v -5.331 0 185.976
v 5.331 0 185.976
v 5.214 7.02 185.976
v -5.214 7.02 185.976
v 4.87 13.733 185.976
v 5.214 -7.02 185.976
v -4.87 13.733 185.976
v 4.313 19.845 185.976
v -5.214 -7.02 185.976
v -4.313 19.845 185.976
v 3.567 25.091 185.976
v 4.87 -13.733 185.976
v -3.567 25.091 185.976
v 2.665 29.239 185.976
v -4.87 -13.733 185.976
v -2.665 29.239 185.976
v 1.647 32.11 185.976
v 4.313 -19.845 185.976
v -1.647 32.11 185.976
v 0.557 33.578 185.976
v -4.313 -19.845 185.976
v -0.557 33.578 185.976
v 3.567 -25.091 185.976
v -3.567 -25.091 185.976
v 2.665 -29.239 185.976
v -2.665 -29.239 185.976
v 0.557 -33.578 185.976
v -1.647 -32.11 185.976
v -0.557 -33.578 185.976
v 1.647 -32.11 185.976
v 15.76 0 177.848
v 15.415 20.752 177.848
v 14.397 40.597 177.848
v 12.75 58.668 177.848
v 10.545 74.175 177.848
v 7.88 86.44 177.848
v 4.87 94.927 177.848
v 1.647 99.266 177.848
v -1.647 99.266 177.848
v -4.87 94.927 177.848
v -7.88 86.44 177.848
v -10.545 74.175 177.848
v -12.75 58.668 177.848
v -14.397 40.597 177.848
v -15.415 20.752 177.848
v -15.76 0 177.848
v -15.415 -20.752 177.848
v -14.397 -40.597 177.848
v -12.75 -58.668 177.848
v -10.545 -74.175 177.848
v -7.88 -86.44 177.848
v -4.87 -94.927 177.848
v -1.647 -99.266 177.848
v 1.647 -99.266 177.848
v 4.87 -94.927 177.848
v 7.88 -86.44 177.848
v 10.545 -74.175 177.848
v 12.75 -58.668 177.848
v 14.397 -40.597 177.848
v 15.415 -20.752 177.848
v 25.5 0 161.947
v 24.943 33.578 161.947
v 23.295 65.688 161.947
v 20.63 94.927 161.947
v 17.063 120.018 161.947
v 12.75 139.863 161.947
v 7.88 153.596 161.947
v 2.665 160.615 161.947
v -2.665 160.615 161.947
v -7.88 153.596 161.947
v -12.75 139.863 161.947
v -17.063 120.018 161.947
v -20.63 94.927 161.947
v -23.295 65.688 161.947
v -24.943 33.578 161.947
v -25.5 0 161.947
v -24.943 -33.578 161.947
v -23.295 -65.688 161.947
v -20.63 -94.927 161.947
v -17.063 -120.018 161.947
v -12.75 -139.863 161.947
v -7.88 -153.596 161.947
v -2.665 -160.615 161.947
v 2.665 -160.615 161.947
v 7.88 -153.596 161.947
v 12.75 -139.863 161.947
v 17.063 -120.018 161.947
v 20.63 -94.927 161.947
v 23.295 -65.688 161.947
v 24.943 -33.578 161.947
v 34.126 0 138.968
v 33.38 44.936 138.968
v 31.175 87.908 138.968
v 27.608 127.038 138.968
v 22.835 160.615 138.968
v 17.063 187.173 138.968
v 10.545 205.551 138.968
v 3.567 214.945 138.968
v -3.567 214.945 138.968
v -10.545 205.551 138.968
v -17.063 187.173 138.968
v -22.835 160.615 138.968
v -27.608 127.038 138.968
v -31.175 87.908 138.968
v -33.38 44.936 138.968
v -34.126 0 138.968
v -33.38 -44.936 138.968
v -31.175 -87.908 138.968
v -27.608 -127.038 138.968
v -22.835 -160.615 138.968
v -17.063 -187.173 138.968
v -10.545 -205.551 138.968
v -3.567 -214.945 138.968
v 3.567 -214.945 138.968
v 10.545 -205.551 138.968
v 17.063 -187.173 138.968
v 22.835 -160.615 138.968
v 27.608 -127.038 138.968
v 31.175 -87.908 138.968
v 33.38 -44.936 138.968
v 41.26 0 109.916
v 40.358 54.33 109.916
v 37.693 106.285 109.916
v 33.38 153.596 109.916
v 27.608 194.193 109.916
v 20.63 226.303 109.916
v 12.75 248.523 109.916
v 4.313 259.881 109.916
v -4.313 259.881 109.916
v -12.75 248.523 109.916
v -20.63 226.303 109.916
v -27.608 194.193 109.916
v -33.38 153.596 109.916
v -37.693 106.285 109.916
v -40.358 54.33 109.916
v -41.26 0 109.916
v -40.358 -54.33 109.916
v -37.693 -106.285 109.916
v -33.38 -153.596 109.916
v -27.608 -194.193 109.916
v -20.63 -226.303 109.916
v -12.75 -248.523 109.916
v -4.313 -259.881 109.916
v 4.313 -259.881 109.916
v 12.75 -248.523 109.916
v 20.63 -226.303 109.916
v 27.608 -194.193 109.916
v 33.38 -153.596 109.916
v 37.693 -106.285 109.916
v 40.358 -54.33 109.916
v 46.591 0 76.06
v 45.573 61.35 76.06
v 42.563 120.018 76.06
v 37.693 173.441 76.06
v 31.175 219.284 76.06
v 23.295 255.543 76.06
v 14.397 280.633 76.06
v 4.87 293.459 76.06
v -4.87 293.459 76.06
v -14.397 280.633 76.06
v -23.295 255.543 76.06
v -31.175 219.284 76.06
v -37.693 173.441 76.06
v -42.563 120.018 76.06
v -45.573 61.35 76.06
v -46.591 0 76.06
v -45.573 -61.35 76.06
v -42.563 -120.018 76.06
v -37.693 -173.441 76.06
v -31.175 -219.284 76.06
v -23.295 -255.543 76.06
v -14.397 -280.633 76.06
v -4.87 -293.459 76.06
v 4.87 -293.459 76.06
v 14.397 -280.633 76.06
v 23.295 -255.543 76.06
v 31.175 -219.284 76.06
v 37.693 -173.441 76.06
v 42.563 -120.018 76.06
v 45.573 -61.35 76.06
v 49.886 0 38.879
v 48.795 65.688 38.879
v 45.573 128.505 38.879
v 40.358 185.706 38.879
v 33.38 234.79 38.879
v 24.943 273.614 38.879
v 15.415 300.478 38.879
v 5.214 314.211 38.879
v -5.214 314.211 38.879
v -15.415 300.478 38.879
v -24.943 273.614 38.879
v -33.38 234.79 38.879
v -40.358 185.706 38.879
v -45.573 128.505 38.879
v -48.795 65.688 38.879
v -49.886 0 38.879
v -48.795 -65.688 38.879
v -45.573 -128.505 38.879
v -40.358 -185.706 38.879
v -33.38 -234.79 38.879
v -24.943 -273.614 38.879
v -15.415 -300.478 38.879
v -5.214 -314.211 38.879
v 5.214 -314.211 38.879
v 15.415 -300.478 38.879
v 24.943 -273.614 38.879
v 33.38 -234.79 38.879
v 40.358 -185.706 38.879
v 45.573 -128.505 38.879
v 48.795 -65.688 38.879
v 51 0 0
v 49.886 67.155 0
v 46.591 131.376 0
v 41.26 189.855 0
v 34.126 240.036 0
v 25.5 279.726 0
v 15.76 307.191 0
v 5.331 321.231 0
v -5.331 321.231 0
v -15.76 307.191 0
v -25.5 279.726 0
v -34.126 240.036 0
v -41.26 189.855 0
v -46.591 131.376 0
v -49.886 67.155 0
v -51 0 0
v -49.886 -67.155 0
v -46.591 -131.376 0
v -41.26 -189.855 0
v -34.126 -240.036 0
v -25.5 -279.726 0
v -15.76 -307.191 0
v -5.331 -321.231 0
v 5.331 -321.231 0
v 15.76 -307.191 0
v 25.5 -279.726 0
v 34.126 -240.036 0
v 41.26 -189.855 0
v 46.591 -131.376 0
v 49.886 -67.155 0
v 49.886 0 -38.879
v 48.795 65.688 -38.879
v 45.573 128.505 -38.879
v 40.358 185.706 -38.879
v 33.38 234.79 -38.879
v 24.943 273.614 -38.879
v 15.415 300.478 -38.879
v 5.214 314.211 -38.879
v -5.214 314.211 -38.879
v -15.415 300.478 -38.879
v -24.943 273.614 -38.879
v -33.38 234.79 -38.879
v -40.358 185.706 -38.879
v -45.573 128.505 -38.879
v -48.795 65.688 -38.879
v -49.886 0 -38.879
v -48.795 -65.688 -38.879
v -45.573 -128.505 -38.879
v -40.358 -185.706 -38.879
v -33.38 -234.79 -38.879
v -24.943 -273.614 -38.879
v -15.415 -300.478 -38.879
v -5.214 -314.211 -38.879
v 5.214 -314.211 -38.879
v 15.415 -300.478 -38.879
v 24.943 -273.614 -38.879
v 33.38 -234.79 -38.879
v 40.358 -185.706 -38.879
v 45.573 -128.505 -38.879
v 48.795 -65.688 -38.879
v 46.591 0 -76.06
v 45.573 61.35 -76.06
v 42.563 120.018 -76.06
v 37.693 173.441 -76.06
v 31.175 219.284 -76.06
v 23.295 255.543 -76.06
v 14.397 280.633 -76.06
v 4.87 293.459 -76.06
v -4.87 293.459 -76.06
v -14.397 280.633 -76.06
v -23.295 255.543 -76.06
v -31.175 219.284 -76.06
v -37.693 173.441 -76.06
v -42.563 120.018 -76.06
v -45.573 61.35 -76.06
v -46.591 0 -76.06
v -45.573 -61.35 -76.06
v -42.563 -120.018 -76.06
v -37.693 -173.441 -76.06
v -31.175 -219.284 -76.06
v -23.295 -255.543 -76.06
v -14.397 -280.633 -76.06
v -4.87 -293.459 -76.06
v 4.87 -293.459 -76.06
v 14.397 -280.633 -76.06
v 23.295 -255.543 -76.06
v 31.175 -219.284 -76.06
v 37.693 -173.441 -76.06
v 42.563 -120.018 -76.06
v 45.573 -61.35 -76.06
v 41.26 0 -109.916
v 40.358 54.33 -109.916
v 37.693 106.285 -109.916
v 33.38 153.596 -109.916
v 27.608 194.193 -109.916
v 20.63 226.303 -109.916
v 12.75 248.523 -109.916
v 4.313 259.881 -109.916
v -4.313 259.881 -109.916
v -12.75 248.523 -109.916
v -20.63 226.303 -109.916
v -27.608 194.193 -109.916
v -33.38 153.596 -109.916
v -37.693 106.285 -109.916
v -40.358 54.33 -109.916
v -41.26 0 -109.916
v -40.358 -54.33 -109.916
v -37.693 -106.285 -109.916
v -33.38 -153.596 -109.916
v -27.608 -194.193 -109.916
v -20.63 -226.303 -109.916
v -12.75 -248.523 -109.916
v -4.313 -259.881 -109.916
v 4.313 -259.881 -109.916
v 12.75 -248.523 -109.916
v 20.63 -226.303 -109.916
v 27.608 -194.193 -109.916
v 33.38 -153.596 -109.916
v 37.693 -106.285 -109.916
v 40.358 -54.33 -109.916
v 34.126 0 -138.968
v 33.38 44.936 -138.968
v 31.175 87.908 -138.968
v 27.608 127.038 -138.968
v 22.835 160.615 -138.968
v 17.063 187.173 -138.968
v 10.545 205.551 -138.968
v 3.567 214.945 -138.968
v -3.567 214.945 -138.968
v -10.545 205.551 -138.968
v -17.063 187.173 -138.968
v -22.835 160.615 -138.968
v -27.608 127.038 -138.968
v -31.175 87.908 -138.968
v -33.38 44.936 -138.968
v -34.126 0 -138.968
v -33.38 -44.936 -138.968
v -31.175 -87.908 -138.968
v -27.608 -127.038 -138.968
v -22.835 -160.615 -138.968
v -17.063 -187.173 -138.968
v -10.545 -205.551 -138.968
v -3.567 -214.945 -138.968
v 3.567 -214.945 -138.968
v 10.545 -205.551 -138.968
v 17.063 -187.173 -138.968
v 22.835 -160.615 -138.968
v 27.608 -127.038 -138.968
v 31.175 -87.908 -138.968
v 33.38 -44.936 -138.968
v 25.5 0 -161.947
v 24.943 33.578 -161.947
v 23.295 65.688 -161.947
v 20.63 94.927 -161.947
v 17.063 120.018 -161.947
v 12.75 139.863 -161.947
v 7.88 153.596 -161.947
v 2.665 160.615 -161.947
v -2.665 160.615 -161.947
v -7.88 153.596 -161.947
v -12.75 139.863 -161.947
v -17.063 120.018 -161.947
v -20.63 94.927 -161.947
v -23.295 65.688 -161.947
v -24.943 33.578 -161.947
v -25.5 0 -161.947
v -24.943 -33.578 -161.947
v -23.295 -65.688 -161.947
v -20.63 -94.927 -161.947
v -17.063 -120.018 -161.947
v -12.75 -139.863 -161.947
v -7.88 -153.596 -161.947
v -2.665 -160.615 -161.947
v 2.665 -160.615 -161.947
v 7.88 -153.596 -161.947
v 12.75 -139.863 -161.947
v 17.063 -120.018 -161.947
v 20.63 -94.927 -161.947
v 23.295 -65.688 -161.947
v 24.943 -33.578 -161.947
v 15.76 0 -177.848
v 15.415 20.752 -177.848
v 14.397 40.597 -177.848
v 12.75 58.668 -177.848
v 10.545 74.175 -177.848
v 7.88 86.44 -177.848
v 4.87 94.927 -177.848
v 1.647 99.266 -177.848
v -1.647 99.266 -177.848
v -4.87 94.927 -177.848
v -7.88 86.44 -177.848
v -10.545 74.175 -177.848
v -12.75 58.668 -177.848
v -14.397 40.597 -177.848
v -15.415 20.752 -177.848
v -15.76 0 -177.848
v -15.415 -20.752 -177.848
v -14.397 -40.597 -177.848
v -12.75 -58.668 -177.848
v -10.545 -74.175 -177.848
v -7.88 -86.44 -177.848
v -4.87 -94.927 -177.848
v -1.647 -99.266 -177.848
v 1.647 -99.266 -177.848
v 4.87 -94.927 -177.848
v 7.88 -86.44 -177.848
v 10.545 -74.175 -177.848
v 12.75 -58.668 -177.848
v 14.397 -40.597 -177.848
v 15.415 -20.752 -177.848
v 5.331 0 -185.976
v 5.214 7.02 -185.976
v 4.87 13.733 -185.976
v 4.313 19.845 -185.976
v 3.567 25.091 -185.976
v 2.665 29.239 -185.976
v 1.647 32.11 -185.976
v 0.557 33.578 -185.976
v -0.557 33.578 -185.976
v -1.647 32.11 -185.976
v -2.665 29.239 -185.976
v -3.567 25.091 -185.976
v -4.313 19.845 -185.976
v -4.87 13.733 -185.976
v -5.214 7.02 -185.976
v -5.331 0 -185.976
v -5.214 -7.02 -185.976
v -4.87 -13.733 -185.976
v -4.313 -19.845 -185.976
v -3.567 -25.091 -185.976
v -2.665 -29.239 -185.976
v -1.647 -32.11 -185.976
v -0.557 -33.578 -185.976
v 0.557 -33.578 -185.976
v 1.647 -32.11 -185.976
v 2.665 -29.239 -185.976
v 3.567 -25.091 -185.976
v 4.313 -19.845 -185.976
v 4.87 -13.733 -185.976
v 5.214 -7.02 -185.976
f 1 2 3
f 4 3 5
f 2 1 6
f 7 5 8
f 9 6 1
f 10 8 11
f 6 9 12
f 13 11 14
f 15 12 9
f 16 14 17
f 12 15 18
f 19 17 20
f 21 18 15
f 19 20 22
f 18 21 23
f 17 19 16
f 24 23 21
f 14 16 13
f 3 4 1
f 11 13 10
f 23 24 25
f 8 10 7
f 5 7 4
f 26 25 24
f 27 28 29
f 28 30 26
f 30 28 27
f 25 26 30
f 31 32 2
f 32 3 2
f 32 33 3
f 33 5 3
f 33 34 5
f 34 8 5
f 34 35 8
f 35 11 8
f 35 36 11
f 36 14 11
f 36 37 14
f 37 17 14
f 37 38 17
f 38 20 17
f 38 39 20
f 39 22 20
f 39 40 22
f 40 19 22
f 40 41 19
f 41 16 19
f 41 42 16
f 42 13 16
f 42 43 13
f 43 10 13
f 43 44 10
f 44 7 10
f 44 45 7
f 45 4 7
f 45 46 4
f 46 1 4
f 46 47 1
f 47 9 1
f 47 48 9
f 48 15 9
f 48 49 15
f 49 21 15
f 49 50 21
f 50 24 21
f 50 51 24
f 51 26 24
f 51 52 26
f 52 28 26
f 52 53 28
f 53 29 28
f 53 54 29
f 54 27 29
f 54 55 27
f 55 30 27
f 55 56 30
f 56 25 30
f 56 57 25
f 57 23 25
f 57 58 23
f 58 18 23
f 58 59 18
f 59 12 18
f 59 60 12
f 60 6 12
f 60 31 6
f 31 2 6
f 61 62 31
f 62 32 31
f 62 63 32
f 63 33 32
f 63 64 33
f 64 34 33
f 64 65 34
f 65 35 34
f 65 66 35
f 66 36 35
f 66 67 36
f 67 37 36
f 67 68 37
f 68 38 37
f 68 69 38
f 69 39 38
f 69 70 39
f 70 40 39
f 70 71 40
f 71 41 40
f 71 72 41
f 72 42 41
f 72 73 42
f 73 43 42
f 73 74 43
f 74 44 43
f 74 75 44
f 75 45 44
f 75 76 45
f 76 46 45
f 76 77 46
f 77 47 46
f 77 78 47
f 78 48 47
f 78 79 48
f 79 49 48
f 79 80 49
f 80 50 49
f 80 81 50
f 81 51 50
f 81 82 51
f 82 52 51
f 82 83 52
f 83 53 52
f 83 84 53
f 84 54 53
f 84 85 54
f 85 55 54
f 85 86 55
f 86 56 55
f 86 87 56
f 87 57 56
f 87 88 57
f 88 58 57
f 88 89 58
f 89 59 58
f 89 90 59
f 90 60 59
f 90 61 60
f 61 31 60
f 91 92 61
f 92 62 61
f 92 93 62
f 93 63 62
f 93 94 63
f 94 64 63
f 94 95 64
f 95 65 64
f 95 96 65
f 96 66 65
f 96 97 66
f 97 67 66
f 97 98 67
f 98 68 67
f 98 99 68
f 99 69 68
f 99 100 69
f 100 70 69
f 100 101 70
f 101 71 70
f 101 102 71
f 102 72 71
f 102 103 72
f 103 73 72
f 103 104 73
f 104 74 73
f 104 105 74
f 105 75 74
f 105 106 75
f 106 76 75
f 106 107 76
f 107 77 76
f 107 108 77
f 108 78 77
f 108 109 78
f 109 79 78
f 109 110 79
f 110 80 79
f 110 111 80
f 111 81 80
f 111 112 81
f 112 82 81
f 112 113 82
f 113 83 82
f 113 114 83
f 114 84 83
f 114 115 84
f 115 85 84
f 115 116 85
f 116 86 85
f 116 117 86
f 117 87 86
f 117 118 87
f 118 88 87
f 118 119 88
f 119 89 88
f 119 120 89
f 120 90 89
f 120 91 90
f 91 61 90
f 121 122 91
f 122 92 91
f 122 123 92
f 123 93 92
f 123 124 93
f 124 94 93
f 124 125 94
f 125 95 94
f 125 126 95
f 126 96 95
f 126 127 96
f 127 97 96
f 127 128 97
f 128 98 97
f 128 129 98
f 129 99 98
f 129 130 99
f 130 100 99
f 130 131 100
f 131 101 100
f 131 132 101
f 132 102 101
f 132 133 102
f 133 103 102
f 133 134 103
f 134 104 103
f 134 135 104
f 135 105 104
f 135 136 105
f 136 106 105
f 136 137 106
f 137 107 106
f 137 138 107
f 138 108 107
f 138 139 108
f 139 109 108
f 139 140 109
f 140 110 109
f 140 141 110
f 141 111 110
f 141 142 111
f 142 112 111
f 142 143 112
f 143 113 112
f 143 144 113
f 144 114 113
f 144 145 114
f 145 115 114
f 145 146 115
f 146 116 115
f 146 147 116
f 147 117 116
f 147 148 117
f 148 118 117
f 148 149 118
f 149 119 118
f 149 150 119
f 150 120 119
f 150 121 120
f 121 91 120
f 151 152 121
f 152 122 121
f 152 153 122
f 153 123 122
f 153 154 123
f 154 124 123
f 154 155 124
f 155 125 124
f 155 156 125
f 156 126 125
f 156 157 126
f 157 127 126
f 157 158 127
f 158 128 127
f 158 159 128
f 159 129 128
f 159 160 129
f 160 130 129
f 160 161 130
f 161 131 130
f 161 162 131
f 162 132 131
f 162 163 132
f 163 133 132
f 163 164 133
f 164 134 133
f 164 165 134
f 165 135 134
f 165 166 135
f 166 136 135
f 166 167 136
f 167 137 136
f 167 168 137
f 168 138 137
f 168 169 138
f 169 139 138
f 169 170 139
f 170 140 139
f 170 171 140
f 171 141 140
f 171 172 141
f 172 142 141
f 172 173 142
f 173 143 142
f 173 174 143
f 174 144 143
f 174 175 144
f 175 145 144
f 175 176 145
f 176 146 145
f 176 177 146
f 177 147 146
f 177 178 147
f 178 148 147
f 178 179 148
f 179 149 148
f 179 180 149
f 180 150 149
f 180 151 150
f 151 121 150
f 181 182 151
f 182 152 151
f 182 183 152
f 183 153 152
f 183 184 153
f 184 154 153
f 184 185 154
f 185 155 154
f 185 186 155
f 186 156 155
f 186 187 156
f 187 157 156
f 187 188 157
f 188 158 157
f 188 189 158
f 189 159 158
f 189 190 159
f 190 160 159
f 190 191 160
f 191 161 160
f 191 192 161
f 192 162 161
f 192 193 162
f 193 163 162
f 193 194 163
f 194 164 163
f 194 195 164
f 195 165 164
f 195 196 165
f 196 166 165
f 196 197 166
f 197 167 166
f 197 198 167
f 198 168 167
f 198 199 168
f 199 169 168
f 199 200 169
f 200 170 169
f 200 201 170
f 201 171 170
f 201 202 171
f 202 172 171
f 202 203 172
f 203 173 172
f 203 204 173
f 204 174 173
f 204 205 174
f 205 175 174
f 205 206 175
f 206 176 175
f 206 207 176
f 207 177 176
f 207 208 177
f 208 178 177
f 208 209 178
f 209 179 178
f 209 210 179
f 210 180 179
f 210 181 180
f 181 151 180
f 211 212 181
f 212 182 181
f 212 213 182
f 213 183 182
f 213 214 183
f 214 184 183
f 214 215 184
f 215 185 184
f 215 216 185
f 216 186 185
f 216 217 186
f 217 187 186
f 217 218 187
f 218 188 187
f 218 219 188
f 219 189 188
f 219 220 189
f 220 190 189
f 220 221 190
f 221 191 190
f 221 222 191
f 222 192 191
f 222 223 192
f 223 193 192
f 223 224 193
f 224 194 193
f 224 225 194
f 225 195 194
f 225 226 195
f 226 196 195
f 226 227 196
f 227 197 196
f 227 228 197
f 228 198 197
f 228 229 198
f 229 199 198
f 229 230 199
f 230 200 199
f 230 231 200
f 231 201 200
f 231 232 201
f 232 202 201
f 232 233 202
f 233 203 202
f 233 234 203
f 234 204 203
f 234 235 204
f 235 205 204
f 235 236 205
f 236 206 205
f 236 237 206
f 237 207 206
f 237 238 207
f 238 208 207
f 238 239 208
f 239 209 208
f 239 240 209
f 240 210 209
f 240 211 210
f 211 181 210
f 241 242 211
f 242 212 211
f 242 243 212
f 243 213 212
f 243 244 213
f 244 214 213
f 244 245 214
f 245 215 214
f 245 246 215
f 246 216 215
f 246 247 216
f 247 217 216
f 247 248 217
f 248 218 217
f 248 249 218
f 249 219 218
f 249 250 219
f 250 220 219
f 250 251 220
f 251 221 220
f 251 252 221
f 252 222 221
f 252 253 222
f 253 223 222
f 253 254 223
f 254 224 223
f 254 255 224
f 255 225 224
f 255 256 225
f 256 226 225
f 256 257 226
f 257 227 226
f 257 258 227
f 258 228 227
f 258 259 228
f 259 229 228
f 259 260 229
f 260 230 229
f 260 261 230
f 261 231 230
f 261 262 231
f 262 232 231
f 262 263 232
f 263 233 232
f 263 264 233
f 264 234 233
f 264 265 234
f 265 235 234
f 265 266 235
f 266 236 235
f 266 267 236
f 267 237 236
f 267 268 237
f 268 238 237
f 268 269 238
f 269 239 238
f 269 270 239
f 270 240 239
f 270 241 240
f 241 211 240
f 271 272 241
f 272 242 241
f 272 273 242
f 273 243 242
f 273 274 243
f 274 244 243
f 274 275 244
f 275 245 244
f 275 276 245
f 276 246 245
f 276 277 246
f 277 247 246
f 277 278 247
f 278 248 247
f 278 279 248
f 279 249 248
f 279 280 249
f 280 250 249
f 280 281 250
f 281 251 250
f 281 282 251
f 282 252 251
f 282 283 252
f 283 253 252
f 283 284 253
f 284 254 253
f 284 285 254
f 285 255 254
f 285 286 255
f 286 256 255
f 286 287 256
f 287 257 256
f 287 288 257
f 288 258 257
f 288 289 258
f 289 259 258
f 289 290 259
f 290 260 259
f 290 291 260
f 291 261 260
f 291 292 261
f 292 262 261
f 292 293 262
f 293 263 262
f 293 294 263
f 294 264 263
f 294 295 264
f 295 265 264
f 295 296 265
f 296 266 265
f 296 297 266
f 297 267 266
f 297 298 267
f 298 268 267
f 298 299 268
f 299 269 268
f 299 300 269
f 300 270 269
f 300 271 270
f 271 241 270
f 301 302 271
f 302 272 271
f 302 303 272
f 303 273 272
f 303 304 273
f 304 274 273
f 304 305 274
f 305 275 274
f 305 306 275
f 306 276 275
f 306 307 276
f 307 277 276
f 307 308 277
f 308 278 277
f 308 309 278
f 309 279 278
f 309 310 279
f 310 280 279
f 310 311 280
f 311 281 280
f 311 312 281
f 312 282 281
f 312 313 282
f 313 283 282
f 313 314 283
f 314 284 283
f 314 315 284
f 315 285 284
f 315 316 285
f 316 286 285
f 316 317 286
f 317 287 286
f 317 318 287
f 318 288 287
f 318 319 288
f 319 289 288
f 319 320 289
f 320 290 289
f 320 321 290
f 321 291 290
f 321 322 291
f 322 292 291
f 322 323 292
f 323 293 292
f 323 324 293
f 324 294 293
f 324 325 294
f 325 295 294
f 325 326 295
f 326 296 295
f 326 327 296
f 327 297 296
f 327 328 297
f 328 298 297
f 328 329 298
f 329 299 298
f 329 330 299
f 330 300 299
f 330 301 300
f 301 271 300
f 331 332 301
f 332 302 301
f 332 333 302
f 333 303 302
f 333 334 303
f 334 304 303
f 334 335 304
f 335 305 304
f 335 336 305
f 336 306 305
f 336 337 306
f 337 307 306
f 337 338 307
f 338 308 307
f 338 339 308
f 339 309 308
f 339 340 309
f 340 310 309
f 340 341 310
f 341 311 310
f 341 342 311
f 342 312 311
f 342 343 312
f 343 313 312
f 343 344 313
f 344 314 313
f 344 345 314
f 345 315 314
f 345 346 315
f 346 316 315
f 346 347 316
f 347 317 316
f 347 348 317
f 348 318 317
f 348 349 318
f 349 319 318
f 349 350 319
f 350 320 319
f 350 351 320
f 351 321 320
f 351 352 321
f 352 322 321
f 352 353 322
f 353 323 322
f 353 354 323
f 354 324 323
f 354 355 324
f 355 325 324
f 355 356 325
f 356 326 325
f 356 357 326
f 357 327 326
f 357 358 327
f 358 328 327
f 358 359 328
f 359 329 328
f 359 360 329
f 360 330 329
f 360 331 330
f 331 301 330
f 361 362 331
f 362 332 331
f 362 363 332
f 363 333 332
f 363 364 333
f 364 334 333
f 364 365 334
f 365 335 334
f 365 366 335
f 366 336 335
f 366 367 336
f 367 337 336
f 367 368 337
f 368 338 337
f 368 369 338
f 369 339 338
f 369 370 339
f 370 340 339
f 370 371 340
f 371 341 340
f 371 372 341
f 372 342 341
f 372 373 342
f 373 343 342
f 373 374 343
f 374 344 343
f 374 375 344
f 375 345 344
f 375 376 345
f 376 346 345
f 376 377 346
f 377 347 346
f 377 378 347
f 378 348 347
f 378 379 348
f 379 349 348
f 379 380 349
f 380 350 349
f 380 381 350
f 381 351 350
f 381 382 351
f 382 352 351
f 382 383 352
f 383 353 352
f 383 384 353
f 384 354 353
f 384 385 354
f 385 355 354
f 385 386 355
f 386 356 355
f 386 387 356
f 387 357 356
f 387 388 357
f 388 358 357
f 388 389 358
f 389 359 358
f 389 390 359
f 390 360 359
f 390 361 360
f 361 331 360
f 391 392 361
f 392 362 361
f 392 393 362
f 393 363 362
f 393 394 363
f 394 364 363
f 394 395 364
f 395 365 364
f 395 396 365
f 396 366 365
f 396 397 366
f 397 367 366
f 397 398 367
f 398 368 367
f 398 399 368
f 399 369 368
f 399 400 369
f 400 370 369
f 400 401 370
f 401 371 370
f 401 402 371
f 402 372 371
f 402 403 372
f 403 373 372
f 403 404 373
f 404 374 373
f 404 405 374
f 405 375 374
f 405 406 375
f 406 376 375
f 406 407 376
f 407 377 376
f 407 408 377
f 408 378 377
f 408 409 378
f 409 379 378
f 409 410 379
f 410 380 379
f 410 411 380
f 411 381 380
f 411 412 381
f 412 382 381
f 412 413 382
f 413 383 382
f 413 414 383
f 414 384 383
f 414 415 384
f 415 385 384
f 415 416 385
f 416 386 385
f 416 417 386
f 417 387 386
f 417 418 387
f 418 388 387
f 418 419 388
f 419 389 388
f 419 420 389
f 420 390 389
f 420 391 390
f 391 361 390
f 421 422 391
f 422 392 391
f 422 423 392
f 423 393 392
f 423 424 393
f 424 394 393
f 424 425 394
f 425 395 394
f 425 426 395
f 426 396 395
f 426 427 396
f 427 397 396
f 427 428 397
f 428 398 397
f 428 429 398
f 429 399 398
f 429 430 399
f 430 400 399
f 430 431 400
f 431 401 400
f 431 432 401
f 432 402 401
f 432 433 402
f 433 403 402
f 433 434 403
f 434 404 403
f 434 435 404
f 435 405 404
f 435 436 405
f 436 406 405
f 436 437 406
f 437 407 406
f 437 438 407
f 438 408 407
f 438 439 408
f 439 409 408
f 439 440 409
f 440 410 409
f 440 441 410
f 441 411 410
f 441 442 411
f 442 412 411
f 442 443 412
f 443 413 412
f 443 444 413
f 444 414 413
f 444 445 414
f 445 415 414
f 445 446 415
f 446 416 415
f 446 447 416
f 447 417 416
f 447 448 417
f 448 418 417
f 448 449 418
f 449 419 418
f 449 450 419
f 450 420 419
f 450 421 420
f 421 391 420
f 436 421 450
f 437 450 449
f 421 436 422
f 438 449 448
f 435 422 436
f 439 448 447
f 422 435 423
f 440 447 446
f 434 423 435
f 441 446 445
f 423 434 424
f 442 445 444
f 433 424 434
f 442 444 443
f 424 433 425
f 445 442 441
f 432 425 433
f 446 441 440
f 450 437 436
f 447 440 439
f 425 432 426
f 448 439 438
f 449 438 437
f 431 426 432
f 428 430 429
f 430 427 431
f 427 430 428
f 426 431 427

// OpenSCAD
// Generated by SolidPython 1.0.1 on 2020-07-29 00:46:46


scale(v = [3, 19, 11]) {
	sphere(r = 17);
}
/***********************************************
*********      SolidPython code:      **********
************************************************
 
# import packages: SolidPython
from solid import *
from solid.utils import *
from itertools import chain, combinations, permutations


class Resize:

    def __init__(self, scad_file):
        self.scad_file = scad_file
        #self.scad_file = import_scad(scad_file)
        # cone/cylinder param:
        self.r1 = 0
        self.r2 = 0
        self.h = 0
        # rectangular prism param:
        self.w = 0
        self.l = 0
        # ellipse param:
        self.r = 0

    # import OpenScad code (file name corresponds to shape)


    # classify shape + parameters
    def assign(self, param1, param2, param3):
        if self.scad_file == 'cone.scad':
            self.r1 = param1
            self.r2 = param2
            self.h = param3
        elif self.scad_file == 'cylinder.scad':
            self.r1 = param1
            self.r2 = param2
            self.h = param3
        elif self.scad_file == 'rectangularPrism.scad':
            self.h = param1
            self.l = param2
            self.w = param3
        else:
            self.r = param1
            self.h = param2

    # resize parameters
    def iterate(self):
        x = range(3, 20, 2)
        i = 1
        if self.scad_file == 'cone.scad':
            tempList = list(permutations(x, 2))
            for temp in tempList:
                param1 = temp[0]
                param2 = temp[1]
                filepath = 'produced_scad_files/' + 'cone' + str(param1) + '_' + str(param2) + '_' + '.scad'
                scad_render_to_file(cylinder(h=param1, r1=param2, r2=0), filepath)

        elif self.scad_file == 'cylinder.scad':
            tempList = list(permutations(x, 3))
            for temp in tempList:
                param1 = temp[0]
                param2 = temp[1]
                filepath = 'produced_scad_files/' + 'cylinder' + str(param1) + '_' + str(param2) + '_' + '.scad'
                scad_render_to_file(cylinder(h=param1, r1=param2, r2=param2), filepath)

        elif self.scad_file == 'rectangularPrism.scad':
            tempList = list(permutations(x, 3))
            for temp in tempList:
                param1 = temp[0]
                param2 = temp[1]
                param3 = temp[2]
                filepath = 'produced_scad_files/' + 'rectangularPrism' + str(param1) + '_' + str(param2) + '_' + str(
                    param3) + '.scad'
                scad_render_to_file(cube(size=(param1, param2, param3)), filepath)

        elif self.scad_file == 'ellipse.scad':
            tempList = list(permutations(x, 4))
            for temp in tempList:
                param1 = temp[0]
                param2 = temp[1]
                param3 = temp[2]
                param4 = temp[3]
                filepath = 'produced_scad_files/' + 'ellipse' + str(param1) + '_' + str(param2) + '_' + str(param3) + '_' + str(param4) + '.scad'
                scad_render_to_file(scale([param1, param2, param3])(sphere(r=param4)), filepath)

    def render_to_scadfile(self):
        scad_render_to_file(scad, 'example.scad') 
 
************************************************/
